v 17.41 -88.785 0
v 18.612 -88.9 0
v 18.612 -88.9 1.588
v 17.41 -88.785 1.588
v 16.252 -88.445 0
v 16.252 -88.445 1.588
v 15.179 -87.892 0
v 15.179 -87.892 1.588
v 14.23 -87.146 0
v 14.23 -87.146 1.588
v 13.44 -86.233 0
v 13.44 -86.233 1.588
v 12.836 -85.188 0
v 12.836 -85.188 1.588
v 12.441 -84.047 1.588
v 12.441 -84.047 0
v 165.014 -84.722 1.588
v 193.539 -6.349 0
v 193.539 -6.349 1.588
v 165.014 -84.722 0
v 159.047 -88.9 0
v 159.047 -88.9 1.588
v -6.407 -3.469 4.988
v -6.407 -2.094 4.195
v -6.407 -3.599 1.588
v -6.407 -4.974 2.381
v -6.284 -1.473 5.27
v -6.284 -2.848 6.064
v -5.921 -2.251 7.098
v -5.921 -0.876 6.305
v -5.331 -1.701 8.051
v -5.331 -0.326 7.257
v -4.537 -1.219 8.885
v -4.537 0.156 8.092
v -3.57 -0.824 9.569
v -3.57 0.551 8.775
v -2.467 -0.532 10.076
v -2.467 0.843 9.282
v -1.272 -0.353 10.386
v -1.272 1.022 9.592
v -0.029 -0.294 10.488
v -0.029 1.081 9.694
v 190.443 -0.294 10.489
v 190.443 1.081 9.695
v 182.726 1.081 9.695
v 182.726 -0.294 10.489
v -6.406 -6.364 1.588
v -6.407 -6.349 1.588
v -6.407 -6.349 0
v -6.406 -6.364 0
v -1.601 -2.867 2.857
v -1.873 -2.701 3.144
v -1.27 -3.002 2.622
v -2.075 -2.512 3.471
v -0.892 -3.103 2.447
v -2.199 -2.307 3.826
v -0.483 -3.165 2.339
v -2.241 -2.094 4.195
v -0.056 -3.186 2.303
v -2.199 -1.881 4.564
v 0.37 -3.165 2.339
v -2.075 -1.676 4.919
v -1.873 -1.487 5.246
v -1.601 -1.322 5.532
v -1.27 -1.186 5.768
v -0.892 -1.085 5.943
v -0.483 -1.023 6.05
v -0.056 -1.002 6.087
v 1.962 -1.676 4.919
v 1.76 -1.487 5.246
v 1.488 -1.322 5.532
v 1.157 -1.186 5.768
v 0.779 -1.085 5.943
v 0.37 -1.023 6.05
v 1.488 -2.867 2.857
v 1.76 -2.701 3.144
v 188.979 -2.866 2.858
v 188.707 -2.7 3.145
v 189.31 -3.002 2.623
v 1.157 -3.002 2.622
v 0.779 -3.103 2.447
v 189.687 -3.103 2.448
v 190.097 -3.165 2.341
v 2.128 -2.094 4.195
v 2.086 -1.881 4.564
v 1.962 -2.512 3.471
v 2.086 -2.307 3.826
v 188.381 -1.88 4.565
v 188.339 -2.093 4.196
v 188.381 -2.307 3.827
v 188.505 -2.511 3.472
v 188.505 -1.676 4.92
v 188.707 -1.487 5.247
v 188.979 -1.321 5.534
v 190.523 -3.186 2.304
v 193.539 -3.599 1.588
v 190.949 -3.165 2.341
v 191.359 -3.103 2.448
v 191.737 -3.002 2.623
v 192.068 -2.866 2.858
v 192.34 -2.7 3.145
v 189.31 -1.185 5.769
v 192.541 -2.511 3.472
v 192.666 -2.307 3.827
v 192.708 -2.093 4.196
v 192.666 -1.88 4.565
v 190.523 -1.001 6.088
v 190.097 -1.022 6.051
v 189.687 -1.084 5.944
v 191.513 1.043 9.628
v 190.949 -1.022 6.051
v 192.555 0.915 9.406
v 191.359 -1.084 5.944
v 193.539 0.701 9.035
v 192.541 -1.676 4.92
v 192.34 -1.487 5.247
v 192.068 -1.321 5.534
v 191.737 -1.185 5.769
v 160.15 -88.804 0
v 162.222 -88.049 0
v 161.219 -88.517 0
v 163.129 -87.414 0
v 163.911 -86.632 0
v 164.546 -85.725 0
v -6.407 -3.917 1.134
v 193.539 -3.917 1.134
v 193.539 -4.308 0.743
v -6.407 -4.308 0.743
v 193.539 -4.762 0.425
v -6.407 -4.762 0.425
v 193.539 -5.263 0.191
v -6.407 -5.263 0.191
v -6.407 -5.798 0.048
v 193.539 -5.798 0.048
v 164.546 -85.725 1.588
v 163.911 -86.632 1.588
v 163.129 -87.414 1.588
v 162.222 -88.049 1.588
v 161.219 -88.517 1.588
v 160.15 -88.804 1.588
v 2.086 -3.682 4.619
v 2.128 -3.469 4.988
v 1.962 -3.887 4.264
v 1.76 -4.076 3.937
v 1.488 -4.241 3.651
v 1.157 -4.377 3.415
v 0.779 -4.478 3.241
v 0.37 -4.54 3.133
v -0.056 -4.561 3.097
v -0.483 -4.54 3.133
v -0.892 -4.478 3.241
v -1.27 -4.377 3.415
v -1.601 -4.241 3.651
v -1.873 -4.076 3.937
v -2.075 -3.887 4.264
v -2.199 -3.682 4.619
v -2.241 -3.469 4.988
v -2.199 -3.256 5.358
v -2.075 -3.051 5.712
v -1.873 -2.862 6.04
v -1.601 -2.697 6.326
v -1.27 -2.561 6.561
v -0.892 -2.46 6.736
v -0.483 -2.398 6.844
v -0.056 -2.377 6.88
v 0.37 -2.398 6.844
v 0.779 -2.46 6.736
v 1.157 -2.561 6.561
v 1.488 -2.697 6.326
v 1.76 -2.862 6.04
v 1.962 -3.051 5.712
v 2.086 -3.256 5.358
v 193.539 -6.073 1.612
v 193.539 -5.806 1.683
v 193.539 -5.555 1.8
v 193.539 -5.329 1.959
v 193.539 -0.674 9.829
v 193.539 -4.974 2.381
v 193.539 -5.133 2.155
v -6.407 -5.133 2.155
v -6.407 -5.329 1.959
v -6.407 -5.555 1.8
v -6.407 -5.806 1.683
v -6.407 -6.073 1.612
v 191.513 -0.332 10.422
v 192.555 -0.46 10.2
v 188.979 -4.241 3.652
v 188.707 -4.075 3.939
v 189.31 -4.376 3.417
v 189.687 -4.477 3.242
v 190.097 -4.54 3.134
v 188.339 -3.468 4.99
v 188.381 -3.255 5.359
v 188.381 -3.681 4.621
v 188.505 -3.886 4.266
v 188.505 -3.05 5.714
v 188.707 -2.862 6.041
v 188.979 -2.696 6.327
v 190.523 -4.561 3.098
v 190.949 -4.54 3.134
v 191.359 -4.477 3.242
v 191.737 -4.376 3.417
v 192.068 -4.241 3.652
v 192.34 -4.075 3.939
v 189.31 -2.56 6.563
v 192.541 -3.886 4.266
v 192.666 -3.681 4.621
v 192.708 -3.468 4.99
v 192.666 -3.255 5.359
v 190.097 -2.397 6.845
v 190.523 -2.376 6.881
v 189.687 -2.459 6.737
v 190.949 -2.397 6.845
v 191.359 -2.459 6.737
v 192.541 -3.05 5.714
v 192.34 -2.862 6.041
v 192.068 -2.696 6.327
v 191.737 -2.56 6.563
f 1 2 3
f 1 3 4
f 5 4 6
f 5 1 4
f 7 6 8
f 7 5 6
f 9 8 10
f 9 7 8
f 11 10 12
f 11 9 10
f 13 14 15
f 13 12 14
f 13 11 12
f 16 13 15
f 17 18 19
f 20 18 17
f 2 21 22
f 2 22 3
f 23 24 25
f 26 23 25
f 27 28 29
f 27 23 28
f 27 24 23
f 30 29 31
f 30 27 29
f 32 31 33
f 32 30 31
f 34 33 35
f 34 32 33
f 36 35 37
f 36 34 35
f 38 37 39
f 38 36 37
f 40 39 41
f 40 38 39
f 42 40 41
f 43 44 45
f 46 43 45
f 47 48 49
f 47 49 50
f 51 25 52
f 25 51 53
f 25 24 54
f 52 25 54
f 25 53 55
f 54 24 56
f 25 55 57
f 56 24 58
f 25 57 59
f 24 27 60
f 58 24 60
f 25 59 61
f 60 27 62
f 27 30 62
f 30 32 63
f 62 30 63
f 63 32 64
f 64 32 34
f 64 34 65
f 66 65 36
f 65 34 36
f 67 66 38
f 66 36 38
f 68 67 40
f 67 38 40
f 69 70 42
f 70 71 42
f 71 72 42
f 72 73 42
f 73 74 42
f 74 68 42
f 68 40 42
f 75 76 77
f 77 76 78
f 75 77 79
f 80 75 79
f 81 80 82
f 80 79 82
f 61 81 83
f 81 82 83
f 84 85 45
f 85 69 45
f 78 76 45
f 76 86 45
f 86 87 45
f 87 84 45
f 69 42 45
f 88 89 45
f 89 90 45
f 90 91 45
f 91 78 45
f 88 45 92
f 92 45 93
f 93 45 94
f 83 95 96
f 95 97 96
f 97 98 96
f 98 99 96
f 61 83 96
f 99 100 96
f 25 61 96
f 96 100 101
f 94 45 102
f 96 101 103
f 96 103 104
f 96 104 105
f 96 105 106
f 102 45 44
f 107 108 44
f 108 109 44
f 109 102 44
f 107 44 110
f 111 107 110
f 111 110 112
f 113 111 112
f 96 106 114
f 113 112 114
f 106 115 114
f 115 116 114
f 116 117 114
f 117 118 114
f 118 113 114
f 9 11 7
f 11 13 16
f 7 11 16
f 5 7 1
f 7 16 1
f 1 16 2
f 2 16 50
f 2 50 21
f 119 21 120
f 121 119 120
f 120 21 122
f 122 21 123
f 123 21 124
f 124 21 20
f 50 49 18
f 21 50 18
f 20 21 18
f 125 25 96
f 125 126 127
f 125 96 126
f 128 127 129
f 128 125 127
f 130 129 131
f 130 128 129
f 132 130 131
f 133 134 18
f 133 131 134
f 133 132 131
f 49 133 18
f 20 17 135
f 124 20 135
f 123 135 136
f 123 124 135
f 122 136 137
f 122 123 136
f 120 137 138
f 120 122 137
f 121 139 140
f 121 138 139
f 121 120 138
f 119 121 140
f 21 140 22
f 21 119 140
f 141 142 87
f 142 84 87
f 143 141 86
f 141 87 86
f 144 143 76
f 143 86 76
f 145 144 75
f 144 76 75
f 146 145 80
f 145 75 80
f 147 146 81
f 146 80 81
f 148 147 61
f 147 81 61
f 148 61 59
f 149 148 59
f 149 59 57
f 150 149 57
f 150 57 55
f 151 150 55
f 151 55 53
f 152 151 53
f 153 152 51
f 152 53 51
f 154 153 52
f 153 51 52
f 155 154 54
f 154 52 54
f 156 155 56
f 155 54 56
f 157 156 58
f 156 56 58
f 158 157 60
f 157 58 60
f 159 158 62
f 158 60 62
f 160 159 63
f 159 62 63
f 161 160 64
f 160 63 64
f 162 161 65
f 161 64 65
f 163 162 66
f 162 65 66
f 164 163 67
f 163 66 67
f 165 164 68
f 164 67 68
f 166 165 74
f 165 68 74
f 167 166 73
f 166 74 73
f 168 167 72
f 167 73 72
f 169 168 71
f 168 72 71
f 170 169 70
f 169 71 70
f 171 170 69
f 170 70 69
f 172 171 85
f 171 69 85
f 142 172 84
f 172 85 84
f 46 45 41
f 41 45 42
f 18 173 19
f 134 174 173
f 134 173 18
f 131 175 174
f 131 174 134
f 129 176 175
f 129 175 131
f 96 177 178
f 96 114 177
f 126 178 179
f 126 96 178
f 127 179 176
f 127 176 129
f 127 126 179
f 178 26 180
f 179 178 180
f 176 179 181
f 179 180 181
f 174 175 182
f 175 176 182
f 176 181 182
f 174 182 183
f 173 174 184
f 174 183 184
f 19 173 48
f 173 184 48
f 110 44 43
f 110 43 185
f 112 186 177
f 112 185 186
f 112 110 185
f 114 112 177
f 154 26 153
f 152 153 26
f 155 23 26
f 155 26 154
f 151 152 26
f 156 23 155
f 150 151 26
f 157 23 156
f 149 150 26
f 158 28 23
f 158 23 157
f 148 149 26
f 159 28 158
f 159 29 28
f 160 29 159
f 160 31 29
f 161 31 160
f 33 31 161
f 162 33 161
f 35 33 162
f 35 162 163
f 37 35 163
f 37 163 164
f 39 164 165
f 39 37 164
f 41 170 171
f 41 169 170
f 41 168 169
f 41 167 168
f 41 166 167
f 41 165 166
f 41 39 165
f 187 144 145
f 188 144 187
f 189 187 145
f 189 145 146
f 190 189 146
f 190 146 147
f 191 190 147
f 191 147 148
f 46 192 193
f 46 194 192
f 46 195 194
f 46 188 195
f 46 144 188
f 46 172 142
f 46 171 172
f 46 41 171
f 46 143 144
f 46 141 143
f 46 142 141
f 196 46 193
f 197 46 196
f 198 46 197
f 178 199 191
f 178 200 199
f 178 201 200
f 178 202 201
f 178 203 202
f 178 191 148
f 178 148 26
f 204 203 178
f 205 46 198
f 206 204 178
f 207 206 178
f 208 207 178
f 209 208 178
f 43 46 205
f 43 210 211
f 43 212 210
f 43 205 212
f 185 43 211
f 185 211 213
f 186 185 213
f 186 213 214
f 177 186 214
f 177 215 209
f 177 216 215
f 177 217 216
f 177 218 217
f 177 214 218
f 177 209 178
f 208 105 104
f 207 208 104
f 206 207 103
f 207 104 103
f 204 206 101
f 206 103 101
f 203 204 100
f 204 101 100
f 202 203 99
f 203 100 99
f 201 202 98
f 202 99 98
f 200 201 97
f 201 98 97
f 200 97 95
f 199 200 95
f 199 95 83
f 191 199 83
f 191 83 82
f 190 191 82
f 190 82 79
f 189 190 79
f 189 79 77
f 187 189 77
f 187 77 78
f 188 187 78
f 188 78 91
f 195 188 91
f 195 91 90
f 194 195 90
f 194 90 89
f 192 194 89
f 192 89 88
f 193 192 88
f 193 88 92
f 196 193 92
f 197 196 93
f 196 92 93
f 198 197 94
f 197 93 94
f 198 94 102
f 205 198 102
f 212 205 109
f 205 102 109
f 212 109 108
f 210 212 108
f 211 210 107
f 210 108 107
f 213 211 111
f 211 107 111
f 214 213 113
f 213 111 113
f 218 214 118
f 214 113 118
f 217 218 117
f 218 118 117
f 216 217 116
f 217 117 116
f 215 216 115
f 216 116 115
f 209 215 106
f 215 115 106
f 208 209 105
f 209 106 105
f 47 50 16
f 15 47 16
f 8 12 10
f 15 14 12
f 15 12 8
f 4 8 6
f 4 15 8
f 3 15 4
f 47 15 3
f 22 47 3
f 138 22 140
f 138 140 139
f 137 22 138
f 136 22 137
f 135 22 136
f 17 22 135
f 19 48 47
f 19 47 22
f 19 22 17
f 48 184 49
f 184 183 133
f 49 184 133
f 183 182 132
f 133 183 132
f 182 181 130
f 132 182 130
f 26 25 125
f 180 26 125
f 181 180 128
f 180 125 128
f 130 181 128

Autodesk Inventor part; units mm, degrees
ref_plane "YZ Plane" through (0, 0, 0) normal (1, 0, 0) x (0, 1, 0)
ref_plane "XZ Plane" through (0, 0, 0) normal (0, 1, 0) x (-1, 0, 0)
ref_plane "XY Plane" through (0, 0, 0) normal (0, 0, 1) x (1, 0, 0)
sketch "Sketch1" plane through (0, 0, 0) normal (0, 0, 1) x (1, 0, 0)
  line L0 (26.2341, -88.9) -> (159.0469, -88.9)
  circle A0 centre (190.5233, -0.0123) radius 2.1844
  arc A1 (193.5393, 5.5758) -> (190.4426, 6.3372) centre (190.5233, -0.0123) ccw
  line L1 (165.0634, -0.0075) -> (177.7634, -0.0075) construction
  line L2 (190.4426, 6.3372) -> (182.7263, 6.3372)
  line L3 (182.7263, 6.3372) -> (-0.0289, 6.3363)
  line L4 (193.5393, 5.5758) -> (193.5393, -6.3491)
  line L5 (193.5393, -6.3491) -> (165.014, -84.7218)
  arc A2 (159.0469, -88.9) -> (165.014, -84.7218) centre (159.0469, -82.55) ccw
  circle A3 centre (-0.0565, -0.0137) radius 2.1845
  arc A4 (-0.0289, 6.3363) -> (-6.4066, -0.0138) centre (-0.0565, -0.0137) ccw
  line L6 (26.2341, -88.9) -> (18.6122, -88.9)
  arc A5 (12.4412, -84.0472) -> (18.6122, -88.9) centre (18.6122, -82.55) ccw
  line L7 (193.5393, -6.3491) -> (-6.4065, -6.3491)
  line L8 (-6.4066, -0.0137) -> (-6.4065, -6.3637)
  line L9 (-6.4065, -6.3637) -> (12.4412, -84.0472)
  point P0 (157.3842, 6.3371)
  point P1 (13.5341, -88.9)
  dimension "d9" = 4.3688
  dimension "d26" = 6.35
  dimension "d29" = 12.7
  dimension "d30" = 6.35
extrude "Extrusion1" add sketch "Sketch1" along normal blind 1.5875
bend part "Bend Part1" radius 3.175 angle 60 line through (193.5393, -6.3491, 0) along (-1, 0, 0) centre toward (0, 0, 1) moving side (0, 1, 0) both sides no
properties part number "wing_wedge" material "Acetal Resin, White"
